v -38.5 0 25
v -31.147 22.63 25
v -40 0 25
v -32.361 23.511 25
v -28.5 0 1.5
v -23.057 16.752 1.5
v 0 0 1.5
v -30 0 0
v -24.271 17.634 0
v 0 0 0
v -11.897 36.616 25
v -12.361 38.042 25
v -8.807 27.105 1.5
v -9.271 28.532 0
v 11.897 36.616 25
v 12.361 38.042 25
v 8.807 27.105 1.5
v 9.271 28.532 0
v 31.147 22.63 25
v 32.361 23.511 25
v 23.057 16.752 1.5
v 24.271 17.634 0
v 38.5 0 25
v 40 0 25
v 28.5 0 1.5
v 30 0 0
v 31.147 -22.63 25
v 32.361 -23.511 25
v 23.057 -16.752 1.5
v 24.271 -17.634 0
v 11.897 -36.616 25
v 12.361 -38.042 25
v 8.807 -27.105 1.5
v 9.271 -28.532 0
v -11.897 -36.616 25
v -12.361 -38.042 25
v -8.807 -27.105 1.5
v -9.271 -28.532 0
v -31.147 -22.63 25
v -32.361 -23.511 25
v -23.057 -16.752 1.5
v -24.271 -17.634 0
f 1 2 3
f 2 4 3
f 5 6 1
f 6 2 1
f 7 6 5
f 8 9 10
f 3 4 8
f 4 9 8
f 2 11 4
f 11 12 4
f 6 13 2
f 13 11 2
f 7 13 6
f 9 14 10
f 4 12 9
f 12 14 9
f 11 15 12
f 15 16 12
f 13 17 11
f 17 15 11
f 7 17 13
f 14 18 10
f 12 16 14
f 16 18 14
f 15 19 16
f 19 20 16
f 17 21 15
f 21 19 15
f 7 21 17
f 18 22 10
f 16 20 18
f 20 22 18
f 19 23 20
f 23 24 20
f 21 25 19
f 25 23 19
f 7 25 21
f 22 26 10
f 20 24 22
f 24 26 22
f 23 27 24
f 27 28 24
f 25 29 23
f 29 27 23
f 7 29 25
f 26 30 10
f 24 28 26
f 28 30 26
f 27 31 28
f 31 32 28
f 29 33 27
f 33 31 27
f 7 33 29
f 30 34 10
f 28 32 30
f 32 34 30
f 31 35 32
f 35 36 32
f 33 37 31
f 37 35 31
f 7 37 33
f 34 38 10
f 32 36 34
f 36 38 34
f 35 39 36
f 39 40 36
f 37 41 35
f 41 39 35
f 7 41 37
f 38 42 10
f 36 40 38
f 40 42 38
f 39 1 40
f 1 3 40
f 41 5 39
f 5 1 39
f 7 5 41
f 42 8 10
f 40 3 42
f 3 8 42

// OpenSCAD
/* [Cube] */
// preview[view:south, tilt:top]
// in mm
bottom_radius = 30;
// in mm
top_radius = 40;
// in mm
tray_depth_mm = 25; 

sides = 10;
// in mm
wall_thickness = 1.5;
// in mm
floor_thickness = 1.5;

/* [Hidden] */
// ignore variable values

center_outer = [0, 0];//[hidden]
bottom_outer = [bottom_radius, 0];//[hidden]
top_outer = [top_radius, tray_depth_mm];//[hidden]
top_inner = [top_radius - wall_thickness, tray_depth_mm];//[hidden]
bottom_inner = [bottom_radius - wall_thickness, floor_thickness];//[hidden]
center_inner = [0, floor_thickness];//[hidden]

module round_tray(offset, bottomOffset){ 
  
  rotate_extrude($fn=sides) 
    polygon( points=[
      center_outer,
      bottom_outer,
      top_outer,
      top_inner,
      bottom_inner,
      center_inner
    ]
  );
      
}
// difference(){

  round_tray(0,0.1);
  // round_tray(wall_thickness, floor_thickness);
// };
